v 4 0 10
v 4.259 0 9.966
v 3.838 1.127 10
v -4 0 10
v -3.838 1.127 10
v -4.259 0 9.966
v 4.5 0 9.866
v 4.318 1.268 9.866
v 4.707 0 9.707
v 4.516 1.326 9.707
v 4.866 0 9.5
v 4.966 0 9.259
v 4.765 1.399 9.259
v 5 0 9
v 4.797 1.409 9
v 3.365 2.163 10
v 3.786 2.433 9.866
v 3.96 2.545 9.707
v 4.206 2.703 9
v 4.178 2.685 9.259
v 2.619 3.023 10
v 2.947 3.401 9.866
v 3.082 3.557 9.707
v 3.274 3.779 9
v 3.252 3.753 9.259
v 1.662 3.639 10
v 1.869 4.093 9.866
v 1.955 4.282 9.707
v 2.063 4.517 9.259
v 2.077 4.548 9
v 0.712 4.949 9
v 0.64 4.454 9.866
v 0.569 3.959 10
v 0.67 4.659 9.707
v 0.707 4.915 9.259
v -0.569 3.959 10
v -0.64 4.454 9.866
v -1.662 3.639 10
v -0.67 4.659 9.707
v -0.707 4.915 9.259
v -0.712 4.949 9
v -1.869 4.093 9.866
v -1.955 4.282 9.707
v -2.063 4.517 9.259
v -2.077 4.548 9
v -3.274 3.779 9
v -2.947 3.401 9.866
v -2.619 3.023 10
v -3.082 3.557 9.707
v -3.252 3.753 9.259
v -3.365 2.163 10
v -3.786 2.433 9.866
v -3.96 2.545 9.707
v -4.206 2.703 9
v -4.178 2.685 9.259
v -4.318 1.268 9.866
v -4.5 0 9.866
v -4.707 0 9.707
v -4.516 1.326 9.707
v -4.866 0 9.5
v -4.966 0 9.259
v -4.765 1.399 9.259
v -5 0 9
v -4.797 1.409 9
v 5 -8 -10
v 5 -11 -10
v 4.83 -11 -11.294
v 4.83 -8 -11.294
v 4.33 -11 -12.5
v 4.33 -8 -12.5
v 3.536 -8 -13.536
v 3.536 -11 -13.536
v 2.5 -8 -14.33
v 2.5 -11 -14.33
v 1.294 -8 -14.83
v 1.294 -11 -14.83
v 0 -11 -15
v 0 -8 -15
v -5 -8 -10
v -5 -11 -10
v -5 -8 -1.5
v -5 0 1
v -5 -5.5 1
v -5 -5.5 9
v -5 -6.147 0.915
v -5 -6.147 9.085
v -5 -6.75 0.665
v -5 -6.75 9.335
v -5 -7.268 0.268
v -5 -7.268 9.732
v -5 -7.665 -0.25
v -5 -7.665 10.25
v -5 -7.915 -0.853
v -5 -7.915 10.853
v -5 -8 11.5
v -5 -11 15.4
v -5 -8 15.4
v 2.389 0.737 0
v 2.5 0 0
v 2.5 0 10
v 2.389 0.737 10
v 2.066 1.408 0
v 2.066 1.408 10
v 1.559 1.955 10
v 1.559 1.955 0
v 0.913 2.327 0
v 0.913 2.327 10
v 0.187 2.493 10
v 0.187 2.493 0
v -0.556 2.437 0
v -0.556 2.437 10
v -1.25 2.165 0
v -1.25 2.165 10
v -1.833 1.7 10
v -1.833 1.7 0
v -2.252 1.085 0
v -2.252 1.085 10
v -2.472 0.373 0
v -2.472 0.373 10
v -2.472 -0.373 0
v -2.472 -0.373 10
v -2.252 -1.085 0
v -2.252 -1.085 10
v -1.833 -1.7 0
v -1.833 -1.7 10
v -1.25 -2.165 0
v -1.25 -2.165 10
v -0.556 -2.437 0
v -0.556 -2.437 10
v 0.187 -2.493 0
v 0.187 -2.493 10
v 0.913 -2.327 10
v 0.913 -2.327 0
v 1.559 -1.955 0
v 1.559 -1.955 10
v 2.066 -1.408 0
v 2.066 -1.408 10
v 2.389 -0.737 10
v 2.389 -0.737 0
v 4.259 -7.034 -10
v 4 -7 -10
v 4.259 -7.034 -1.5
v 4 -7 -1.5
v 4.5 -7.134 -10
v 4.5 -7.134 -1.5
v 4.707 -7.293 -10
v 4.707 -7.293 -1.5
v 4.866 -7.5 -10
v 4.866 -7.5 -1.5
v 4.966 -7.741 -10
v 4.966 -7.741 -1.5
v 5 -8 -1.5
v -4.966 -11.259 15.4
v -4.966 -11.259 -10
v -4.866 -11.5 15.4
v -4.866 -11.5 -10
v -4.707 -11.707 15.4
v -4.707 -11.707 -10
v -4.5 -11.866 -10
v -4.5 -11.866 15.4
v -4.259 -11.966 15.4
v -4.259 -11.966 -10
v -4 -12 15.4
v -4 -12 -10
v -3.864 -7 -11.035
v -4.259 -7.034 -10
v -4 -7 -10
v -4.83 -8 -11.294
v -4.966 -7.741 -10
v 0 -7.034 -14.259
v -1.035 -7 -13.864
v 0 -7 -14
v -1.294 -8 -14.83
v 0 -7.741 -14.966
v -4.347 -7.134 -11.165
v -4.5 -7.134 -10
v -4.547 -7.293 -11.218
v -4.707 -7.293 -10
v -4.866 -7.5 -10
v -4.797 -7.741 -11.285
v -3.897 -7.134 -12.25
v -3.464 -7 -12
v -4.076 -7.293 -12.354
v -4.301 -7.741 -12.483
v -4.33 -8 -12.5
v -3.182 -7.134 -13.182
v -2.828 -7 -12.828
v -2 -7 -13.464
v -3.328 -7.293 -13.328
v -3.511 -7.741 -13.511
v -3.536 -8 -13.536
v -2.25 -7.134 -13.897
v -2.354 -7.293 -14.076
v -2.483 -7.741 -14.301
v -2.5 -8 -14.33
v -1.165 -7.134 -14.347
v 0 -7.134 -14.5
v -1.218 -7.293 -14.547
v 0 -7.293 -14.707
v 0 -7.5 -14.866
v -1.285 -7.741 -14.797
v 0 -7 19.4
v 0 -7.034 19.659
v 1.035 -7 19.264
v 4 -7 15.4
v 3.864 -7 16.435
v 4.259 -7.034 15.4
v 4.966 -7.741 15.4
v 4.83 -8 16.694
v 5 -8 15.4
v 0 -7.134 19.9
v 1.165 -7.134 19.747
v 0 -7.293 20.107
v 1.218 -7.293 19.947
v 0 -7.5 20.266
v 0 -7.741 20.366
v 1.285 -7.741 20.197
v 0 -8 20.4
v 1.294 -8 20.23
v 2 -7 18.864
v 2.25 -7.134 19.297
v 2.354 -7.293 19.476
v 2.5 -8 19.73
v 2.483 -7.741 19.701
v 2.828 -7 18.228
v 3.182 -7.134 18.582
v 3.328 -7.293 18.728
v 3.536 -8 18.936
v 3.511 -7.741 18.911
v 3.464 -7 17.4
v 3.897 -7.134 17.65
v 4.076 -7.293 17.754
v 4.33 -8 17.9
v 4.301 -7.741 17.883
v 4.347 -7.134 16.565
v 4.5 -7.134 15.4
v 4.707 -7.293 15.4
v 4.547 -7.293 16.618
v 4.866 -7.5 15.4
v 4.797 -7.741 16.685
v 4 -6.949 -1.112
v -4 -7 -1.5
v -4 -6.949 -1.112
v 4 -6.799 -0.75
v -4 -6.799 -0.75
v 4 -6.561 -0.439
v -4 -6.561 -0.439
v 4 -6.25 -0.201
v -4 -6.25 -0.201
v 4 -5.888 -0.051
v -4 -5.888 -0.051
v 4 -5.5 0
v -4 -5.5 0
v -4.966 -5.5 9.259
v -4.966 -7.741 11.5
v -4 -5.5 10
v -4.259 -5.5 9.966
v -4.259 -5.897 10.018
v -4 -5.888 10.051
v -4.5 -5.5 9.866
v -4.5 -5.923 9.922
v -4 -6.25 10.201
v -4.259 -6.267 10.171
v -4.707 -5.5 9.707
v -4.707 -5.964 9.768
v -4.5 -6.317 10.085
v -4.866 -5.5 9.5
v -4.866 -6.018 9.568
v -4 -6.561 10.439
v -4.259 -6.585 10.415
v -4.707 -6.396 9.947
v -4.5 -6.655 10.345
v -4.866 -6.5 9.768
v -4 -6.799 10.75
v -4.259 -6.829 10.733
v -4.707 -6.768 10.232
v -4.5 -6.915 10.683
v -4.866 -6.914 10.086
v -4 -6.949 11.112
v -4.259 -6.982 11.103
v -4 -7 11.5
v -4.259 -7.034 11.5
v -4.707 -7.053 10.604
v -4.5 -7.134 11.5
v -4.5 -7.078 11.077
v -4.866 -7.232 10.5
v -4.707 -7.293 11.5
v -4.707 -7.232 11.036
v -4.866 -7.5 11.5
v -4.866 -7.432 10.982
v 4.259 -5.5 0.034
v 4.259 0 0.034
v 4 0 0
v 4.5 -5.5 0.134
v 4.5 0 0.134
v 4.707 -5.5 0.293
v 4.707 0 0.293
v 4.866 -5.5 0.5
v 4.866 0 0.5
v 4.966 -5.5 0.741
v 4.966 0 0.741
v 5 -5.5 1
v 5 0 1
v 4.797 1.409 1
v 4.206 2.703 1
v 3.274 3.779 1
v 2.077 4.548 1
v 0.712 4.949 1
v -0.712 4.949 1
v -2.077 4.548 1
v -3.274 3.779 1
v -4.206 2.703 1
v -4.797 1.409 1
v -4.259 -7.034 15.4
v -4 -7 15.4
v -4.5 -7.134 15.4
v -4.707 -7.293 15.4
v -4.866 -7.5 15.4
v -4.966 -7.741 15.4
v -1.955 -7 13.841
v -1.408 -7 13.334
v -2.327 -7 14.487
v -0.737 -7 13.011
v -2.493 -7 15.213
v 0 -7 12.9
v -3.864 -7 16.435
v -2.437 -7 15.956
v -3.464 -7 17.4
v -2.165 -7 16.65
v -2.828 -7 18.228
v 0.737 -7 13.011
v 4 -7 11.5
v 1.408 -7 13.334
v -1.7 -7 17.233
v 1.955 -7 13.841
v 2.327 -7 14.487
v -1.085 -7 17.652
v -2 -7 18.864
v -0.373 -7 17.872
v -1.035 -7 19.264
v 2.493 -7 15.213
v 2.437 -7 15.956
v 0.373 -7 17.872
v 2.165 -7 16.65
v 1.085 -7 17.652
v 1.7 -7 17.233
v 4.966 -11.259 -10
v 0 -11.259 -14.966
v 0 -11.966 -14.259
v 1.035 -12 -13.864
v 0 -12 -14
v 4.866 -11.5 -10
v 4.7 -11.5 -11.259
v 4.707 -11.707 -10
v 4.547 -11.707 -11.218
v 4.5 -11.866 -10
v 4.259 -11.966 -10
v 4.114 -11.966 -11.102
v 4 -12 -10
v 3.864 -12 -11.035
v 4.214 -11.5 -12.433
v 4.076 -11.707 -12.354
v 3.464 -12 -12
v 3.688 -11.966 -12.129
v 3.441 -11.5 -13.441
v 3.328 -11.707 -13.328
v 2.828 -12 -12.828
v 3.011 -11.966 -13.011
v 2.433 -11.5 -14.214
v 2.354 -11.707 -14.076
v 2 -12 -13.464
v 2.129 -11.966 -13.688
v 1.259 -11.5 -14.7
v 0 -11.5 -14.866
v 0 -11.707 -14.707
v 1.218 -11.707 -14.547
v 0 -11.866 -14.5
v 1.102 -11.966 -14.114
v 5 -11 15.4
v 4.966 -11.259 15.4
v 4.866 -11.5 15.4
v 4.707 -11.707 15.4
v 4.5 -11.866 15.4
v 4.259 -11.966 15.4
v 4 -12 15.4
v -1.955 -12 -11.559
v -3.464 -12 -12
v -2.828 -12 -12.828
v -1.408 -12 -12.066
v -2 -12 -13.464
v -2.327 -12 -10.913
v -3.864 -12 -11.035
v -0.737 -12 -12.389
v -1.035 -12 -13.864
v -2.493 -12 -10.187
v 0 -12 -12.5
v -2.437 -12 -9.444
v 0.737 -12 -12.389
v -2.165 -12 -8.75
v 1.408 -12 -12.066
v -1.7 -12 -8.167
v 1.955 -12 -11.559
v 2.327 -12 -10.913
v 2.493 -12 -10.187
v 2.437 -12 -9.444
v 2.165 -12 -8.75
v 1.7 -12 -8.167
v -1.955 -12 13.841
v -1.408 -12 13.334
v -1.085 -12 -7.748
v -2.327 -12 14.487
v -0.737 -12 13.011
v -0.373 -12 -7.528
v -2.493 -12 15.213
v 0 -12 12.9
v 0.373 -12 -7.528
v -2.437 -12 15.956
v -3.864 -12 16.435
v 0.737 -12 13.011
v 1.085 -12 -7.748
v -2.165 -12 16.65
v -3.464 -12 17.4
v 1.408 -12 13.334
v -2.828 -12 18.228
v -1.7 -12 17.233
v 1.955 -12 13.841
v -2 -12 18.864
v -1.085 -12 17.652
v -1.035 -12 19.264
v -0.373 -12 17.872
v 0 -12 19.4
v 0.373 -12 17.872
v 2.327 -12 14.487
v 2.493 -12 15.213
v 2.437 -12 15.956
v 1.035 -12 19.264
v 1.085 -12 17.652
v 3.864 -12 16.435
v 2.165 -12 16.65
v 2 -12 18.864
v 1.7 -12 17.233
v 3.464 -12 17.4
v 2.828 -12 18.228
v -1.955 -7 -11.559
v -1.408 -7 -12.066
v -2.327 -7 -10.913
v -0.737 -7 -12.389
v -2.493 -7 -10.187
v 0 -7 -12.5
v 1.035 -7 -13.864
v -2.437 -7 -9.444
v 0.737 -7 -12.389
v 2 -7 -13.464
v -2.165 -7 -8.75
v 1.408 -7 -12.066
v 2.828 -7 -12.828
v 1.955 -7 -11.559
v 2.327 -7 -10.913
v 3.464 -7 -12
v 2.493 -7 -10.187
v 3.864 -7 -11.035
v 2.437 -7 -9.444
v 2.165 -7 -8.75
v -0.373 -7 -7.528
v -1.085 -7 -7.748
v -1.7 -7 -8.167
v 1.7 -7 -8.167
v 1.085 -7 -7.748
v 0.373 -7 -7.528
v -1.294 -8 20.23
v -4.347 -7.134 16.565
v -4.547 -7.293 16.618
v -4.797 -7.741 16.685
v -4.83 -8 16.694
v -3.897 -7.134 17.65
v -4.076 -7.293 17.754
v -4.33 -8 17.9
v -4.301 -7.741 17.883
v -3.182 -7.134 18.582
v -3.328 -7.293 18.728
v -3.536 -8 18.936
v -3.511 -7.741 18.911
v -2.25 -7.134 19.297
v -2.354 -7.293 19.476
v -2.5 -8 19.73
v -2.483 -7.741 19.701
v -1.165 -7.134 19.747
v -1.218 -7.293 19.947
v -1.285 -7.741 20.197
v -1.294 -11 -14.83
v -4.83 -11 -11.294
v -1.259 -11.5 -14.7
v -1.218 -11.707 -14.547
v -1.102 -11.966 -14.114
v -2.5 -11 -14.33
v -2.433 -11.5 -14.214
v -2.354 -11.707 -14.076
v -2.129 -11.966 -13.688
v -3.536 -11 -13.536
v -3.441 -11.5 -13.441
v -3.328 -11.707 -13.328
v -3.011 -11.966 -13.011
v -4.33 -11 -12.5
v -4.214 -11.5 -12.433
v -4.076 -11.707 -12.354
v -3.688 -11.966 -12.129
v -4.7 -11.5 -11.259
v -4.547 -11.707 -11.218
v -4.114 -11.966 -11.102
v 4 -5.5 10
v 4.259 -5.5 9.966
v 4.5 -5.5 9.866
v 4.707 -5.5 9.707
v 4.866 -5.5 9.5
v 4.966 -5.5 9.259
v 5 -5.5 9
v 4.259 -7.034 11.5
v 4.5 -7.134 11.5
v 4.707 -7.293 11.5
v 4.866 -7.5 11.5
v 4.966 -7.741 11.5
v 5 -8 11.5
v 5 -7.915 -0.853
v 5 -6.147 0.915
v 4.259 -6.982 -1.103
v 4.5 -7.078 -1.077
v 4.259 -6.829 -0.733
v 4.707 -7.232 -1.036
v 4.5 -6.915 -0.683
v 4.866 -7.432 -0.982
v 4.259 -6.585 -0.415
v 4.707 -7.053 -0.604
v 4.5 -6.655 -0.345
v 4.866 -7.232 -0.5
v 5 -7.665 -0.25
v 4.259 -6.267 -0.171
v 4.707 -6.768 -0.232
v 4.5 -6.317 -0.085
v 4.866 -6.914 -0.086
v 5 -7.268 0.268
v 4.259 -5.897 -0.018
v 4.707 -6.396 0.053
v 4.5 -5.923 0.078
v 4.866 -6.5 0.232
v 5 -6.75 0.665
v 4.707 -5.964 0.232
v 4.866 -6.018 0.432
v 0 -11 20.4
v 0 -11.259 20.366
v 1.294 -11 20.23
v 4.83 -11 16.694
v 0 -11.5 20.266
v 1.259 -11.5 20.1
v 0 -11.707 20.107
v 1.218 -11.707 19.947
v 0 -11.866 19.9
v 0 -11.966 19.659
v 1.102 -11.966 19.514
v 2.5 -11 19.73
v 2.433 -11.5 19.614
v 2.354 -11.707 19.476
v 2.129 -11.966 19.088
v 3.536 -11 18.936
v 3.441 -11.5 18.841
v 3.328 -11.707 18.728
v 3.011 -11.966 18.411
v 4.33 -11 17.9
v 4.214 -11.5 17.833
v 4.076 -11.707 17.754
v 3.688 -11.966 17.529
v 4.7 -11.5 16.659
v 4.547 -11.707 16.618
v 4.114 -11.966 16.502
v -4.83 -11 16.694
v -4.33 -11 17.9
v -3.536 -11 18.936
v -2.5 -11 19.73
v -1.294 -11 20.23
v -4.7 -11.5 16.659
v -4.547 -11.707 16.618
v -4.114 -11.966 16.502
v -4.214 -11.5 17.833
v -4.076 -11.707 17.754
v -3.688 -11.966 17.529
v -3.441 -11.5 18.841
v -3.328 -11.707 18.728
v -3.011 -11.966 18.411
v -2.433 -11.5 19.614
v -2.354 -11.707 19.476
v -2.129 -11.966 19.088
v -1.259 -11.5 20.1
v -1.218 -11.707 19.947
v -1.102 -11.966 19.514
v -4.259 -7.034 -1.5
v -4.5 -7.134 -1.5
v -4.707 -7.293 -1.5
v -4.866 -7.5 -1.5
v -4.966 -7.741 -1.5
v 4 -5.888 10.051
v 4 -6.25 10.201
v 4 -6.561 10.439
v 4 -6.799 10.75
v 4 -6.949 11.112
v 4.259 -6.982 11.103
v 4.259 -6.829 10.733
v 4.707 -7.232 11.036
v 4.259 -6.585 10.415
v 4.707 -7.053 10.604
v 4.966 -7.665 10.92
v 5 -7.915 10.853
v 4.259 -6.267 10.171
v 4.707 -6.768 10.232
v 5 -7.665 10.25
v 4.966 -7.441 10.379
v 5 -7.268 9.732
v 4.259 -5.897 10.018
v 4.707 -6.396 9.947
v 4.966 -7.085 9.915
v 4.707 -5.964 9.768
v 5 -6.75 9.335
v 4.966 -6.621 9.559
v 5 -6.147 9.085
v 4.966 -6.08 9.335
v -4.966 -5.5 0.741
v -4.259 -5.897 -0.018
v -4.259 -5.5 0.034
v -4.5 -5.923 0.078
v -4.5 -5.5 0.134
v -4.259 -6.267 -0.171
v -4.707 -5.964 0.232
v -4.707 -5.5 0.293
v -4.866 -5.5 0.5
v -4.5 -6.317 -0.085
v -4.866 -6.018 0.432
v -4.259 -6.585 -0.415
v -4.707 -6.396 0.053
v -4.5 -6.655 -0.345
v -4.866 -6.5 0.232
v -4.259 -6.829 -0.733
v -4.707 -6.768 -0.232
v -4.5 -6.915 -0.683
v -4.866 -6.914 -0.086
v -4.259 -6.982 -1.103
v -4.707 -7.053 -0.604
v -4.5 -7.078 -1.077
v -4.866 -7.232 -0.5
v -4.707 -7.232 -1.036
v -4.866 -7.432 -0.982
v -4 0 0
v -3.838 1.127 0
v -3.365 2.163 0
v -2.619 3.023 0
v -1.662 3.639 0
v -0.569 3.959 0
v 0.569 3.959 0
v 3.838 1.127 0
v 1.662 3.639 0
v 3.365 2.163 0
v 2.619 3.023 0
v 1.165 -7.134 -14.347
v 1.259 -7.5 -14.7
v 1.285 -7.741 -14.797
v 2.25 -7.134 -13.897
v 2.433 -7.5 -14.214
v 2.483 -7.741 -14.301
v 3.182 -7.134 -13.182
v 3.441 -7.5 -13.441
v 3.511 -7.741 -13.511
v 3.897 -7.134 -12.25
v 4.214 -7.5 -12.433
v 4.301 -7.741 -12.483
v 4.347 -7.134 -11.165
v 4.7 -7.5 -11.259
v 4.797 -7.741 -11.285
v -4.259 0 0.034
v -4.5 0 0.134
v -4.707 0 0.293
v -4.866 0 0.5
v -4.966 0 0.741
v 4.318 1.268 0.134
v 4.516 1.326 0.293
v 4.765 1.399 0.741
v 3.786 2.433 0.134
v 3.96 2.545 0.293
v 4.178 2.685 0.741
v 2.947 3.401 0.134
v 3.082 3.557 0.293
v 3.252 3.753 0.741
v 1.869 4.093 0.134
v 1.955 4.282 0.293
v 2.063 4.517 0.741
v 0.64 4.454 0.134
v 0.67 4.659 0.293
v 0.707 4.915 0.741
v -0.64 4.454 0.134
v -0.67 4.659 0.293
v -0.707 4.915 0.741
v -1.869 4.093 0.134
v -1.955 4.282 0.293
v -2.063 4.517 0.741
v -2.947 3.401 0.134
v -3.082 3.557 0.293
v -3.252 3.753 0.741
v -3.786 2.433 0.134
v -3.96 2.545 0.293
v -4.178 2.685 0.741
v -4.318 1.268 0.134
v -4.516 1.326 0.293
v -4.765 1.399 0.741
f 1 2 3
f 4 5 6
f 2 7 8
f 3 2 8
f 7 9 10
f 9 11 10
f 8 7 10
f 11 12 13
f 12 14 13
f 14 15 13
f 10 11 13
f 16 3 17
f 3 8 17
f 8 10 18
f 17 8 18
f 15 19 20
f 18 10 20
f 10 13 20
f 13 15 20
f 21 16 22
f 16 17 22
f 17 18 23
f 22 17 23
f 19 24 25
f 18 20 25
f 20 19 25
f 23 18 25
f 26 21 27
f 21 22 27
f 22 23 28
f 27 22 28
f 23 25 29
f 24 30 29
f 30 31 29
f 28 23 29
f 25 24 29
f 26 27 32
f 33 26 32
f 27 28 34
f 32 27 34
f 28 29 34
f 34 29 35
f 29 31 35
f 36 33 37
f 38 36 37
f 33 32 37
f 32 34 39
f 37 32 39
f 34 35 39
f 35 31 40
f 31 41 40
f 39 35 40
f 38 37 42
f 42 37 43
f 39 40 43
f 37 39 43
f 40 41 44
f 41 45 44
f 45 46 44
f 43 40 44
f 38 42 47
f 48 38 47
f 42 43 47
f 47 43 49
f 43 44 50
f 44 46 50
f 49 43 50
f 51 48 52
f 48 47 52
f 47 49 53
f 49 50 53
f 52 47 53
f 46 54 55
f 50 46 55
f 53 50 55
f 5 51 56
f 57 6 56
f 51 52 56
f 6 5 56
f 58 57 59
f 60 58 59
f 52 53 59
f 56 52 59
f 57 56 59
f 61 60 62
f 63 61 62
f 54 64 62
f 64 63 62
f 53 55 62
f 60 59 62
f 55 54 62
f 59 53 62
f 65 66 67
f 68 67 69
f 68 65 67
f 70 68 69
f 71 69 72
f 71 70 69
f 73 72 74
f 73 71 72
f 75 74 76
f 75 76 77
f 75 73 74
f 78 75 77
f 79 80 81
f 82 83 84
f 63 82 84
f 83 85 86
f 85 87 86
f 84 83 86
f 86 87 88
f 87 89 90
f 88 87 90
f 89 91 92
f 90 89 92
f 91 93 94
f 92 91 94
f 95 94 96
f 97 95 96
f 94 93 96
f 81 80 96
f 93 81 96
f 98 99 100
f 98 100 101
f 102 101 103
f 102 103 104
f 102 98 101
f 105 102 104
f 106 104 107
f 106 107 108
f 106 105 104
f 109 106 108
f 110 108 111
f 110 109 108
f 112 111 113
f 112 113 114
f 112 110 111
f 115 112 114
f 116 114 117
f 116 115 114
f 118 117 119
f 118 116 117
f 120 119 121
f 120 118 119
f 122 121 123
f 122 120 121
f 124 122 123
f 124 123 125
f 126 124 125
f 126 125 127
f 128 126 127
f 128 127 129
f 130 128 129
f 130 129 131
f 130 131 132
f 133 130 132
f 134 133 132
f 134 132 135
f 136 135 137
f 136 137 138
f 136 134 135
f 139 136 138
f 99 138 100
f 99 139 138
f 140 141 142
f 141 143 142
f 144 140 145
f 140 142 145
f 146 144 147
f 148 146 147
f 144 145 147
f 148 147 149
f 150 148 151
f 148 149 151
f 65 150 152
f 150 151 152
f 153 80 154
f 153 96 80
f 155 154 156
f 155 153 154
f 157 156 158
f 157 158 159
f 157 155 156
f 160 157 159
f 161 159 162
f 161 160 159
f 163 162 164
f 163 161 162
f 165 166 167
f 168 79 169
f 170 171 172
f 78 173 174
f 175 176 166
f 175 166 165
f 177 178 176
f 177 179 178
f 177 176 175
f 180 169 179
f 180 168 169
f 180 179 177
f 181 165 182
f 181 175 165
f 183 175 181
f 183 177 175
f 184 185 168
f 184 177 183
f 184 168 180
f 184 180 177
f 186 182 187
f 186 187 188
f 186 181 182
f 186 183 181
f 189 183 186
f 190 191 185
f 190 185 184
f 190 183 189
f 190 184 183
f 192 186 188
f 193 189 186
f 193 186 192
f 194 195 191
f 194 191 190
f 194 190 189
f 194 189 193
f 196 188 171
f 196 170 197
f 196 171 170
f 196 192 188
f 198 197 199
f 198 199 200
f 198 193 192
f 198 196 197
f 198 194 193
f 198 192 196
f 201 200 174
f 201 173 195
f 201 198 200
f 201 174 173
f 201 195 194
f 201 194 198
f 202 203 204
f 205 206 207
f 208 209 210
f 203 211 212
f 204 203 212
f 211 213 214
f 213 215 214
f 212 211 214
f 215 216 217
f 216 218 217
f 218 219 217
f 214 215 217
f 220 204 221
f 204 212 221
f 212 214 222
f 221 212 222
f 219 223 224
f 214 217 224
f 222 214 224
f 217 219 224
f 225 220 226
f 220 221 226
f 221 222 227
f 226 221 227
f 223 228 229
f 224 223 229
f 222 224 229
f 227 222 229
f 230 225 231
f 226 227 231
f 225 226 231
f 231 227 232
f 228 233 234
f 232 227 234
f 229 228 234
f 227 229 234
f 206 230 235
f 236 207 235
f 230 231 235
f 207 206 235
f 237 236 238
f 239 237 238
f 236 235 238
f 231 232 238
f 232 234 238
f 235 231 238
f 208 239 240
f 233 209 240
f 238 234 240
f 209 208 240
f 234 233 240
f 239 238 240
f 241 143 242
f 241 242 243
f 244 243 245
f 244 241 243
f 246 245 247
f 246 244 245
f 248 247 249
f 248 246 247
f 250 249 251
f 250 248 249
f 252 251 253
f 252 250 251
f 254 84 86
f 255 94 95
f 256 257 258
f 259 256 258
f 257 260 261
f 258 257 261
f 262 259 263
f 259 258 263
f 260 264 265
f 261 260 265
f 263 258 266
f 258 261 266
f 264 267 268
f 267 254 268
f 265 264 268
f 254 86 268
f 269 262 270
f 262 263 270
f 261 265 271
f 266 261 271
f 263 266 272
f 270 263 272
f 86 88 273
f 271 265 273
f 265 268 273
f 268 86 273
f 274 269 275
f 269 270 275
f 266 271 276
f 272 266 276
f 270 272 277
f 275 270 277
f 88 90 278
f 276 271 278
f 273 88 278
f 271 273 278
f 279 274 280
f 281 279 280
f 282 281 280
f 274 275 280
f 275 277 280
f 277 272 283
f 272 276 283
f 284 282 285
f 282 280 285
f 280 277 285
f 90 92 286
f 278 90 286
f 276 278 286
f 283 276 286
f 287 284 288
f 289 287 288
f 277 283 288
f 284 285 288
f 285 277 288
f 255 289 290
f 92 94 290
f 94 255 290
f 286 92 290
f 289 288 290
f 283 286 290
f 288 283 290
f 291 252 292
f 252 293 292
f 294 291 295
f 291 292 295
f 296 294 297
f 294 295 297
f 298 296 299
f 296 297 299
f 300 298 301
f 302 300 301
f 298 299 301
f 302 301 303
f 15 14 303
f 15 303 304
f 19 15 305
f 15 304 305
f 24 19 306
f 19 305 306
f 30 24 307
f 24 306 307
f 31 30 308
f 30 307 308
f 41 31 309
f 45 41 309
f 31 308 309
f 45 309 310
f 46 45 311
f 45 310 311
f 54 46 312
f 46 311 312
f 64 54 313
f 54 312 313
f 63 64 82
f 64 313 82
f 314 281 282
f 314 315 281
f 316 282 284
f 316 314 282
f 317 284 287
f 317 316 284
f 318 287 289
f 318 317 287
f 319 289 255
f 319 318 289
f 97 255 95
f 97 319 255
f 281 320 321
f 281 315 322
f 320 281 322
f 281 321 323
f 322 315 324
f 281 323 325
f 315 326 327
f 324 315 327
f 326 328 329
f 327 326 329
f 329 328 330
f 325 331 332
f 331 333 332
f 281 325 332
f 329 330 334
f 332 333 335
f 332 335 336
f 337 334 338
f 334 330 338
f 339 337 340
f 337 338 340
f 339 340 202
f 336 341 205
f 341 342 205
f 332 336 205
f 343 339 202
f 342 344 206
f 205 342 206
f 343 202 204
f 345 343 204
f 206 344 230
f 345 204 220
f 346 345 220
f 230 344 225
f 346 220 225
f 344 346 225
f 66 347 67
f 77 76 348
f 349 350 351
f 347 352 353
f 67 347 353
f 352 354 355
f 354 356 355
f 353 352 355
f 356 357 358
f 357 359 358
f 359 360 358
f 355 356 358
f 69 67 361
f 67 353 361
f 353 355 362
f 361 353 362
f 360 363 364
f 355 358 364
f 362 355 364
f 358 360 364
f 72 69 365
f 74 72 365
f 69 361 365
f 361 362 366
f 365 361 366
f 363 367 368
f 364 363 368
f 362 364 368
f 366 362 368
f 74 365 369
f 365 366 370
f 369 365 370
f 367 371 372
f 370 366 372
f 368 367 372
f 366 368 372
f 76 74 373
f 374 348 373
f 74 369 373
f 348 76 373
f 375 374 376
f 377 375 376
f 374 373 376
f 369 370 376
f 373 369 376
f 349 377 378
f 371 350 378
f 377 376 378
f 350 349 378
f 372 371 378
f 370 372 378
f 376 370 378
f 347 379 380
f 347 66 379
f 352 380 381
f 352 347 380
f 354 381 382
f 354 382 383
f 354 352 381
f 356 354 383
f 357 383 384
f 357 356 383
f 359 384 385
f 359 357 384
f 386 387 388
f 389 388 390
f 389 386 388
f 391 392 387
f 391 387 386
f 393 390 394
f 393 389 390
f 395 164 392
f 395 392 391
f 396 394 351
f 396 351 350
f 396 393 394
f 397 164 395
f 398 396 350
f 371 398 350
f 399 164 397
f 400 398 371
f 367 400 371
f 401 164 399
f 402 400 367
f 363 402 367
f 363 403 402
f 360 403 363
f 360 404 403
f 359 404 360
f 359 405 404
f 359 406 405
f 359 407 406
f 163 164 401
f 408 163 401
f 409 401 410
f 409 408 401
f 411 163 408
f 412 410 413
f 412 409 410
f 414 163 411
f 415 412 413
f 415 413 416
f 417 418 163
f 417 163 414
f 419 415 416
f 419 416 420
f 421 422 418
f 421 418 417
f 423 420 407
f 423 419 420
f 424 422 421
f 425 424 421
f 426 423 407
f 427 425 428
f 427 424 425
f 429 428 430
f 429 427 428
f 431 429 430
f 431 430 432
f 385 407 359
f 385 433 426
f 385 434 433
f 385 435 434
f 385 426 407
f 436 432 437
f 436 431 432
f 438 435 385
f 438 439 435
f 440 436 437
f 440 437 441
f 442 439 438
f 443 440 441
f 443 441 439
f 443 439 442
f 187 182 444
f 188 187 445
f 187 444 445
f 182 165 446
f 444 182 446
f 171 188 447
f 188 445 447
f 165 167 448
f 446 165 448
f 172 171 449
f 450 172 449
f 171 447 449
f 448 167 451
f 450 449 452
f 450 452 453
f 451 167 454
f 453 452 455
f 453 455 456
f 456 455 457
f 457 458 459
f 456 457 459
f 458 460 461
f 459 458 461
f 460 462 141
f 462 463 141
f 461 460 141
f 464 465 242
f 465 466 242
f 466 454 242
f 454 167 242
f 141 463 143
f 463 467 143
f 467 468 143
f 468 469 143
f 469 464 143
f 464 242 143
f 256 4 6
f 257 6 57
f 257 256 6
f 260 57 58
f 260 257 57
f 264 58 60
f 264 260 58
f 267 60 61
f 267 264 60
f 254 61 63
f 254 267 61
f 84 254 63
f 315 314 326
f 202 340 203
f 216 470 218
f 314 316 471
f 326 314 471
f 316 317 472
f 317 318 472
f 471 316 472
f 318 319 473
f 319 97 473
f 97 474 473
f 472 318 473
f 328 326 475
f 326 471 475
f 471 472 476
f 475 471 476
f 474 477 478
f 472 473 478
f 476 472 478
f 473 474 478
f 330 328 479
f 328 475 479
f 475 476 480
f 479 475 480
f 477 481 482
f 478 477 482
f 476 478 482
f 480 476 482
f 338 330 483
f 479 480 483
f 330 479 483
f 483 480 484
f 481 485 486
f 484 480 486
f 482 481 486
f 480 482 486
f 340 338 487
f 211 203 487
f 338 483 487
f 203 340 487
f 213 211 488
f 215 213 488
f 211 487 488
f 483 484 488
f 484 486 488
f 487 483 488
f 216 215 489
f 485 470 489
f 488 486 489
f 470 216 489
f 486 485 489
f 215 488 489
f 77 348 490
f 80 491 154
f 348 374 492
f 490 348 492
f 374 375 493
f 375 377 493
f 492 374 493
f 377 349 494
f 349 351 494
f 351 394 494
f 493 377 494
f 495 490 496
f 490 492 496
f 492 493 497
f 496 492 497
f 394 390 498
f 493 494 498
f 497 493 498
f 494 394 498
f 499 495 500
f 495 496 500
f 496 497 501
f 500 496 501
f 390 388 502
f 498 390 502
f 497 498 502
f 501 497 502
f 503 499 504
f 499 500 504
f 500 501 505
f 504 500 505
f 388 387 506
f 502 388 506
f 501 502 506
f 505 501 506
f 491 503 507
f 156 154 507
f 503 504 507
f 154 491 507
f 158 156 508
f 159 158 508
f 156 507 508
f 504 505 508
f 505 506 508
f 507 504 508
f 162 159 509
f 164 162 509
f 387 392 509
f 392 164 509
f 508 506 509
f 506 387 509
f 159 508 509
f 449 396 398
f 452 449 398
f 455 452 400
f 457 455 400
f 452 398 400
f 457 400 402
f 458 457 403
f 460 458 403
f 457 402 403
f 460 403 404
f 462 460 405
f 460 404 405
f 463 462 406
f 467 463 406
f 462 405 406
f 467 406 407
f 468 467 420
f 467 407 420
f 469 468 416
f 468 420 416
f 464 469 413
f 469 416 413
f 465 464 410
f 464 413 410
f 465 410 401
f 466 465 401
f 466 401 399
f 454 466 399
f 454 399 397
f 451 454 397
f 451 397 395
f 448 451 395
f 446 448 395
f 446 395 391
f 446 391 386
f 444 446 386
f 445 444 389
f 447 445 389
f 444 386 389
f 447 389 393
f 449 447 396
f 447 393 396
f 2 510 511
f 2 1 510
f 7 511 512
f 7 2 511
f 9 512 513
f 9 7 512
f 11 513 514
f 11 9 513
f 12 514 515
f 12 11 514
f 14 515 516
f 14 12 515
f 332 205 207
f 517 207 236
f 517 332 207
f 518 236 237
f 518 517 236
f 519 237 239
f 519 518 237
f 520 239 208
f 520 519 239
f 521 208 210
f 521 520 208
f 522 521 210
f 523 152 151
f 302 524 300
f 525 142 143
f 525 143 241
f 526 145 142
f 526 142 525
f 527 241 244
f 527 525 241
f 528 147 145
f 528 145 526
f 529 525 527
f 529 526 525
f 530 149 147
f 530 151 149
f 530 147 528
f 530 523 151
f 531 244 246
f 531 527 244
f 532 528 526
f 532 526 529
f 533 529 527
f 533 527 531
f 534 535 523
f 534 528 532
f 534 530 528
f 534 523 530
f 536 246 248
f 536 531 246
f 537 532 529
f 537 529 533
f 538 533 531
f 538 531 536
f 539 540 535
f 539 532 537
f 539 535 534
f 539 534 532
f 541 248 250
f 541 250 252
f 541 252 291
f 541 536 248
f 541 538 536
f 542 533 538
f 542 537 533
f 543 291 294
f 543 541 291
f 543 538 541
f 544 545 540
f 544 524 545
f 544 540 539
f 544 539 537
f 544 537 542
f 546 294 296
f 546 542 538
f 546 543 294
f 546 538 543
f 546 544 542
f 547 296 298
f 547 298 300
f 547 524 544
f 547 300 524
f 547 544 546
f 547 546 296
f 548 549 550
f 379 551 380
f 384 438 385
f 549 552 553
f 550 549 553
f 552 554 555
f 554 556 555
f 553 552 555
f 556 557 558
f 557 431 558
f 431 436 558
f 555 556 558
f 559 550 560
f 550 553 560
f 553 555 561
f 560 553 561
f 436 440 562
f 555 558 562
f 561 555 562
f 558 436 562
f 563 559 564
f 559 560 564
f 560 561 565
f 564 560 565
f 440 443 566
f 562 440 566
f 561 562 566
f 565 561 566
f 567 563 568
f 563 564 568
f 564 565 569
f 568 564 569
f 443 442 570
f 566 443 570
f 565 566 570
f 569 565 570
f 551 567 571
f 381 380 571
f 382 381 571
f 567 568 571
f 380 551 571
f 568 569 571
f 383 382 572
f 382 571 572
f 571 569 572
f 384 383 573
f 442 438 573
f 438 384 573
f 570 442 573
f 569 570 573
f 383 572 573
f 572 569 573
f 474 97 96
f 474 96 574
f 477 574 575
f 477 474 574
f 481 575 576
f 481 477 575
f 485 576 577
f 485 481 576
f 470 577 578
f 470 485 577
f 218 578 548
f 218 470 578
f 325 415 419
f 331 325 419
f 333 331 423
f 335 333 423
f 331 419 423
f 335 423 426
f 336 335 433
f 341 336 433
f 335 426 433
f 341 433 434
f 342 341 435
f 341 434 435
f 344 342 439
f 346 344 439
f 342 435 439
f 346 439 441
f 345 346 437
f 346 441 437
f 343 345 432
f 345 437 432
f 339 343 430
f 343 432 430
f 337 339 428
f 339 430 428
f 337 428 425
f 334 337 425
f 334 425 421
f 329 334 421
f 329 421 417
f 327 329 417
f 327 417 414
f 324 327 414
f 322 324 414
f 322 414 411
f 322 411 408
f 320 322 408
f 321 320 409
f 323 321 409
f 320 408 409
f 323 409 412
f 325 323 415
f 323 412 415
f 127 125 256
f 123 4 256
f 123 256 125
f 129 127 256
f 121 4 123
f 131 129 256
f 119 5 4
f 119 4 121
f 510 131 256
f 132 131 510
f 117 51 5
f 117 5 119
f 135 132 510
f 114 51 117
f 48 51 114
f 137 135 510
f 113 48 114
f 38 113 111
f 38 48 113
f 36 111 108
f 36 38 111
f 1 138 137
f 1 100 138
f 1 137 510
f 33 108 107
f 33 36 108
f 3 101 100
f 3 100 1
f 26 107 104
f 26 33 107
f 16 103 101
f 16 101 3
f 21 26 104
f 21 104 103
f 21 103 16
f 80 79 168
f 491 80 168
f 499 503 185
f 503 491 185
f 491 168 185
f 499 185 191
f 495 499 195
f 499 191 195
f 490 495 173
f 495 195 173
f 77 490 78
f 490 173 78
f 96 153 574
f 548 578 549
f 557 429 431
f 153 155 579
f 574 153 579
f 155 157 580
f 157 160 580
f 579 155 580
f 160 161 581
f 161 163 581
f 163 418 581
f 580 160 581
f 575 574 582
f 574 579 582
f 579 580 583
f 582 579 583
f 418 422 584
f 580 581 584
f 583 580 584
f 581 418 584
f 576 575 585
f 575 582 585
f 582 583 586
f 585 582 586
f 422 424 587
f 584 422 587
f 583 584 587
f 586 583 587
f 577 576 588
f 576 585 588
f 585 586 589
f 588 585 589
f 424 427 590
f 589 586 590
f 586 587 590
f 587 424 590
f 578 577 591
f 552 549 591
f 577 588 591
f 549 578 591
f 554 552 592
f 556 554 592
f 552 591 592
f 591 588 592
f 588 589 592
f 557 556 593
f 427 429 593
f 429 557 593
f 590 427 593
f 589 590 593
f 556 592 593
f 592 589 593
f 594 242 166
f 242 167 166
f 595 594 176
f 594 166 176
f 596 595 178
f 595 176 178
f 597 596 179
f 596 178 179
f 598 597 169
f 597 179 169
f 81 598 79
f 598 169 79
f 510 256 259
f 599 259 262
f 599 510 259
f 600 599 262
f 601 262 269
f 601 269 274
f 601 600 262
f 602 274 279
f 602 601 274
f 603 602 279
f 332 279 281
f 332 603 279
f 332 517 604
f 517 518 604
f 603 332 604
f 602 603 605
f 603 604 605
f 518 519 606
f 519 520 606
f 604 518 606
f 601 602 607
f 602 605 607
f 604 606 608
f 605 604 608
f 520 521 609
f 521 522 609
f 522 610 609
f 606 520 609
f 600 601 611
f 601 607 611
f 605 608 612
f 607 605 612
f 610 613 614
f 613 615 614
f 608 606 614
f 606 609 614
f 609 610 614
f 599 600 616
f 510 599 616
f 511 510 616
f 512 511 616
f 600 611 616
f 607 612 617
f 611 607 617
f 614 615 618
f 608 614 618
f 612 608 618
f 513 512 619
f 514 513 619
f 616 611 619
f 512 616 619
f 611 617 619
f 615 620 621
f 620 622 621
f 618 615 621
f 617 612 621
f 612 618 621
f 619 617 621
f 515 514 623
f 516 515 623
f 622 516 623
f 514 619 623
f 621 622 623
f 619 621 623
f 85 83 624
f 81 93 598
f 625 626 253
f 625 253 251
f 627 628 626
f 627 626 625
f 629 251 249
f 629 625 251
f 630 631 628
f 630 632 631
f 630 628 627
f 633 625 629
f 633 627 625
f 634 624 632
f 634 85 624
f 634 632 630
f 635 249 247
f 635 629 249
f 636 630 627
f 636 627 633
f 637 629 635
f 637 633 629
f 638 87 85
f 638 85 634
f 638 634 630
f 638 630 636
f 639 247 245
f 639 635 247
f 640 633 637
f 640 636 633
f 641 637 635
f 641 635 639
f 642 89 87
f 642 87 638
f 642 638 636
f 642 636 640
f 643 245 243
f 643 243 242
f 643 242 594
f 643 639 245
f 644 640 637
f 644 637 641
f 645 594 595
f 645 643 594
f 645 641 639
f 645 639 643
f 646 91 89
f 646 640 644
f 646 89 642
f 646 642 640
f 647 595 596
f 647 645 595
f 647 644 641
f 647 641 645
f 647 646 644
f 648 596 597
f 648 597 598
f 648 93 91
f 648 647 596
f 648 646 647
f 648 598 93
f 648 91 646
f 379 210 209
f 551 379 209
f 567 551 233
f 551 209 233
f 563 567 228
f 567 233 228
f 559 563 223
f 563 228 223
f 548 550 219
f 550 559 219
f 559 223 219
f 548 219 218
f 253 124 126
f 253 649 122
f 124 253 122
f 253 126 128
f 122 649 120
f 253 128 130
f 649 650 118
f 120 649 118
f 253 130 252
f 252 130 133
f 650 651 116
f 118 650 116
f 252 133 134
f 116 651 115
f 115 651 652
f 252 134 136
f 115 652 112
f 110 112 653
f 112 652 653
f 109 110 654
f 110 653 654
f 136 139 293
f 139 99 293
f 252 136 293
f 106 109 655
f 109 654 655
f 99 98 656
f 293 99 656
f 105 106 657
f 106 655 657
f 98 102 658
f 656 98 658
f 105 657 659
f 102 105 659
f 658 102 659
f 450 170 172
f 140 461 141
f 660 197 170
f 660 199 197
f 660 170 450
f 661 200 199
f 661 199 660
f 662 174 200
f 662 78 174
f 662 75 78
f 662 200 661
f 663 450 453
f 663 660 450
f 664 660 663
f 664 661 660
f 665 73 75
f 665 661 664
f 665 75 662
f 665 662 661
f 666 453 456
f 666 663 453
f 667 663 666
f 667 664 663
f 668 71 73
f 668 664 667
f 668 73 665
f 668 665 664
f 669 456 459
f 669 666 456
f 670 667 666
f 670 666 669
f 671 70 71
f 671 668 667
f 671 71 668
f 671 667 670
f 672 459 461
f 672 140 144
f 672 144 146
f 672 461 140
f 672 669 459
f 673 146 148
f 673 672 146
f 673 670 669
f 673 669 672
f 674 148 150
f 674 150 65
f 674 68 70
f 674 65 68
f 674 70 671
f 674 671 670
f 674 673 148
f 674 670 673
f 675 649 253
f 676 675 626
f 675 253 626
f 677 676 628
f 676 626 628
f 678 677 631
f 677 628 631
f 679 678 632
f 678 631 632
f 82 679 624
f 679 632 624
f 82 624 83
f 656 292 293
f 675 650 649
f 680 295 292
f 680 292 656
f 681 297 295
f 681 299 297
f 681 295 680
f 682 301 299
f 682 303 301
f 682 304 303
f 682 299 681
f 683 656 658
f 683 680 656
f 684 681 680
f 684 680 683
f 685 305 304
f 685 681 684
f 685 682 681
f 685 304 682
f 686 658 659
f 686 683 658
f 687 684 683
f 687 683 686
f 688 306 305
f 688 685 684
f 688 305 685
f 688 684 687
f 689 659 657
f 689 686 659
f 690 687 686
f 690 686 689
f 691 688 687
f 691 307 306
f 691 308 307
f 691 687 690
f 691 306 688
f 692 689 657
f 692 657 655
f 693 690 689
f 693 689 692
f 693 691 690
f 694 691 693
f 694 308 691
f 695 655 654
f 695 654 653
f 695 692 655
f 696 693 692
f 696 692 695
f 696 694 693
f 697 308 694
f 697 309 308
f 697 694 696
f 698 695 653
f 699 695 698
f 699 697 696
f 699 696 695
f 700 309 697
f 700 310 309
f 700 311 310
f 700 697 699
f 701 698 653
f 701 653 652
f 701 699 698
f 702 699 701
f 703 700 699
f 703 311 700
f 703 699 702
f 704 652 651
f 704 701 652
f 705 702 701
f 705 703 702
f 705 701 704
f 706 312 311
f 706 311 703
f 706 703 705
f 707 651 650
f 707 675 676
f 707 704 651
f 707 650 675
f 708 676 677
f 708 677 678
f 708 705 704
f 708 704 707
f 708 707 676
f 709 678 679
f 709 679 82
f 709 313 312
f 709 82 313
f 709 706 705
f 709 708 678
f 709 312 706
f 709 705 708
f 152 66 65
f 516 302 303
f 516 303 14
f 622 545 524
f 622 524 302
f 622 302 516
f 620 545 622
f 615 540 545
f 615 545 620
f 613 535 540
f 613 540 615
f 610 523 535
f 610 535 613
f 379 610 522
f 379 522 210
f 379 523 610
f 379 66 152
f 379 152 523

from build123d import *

# Parameters (mm, degrees)
SKETCH1_R           = 2.5
BOSS_EXTRUDE1_DEPTH = 10
SKETCH2_W           = 10
SKETCH2_H           = 15
SKETCH2_R           = 2.5
SKETCH2_H_2         = 10.4
BOSS_EXTRUDE2_DEPTH = 5
FILLET1_R           = 5
FILLET2_R           = 1.5
FILLET3_R           = 1


with BuildPart() as part:
    # Sketch1 → Boss-Extrude1 (new body)
    with BuildSketch(Plane.XY):
        with BuildLine():
            Line((-5, 0), (-5, -12))
            Line((-5, -12), (5, -12))
            Line((5, -12), (5, 0))
            ThreePointArc((5, 0), (0, 5), (-5, 0))
        make_face()
        Circle(SKETCH1_R, mode=Mode.SUBTRACT)
    extrude(amount=BOSS_EXTRUDE1_DEPTH)

    # Sketch2 → Boss-Extrude2 (add)
    # profile 1 of 2: a face of its own
    with BuildSketch(Plane.XZ.offset(12)):
        with Locations((0, -7.5)):
            Rectangle(SKETCH2_W, SKETCH2_H)
        with Locations(Location((0, -10, 0), (0, 0, 270))):
            Circle(SKETCH2_R, mode=Mode.SUBTRACT)
    # profile 2 of 2: a face of its own
    with BuildSketch(Plane.XZ.offset(12)):
        with Locations((0, 15.2)):
            Rectangle(SKETCH2_W, SKETCH2_H_2)
        with Locations(Location((0, 15.4, 0), (0, 0, 270))):
            Circle(SKETCH2_R, mode=Mode.SUBTRACT)
    extrude(amount=-BOSS_EXTRUDE2_DEPTH)

    # Fillet1
    fillet1_edges = [part.edges().sort_by_distance(p)[0] for p in [
        (5, -9.5, -15),
        (5, -9.5, 20.4),
        (-5, -9.5, 20.4),
        (-5, -9.5, -15),
    ]]
    fillet(fillet1_edges, radius=FILLET1_R - 0.0001)  # a hair under: the kernel refuses the full size

    # Fillet2
    fillet2_edges = [part.edges().sort_by_distance(p)[0] for p in [
        (0, -7, 0),
        (0, -7, 10),
    ]]
    fillet(fillet2_edges, radius=FILLET2_R)

    # Fillet3
    fillet3_edges = [part.edges().sort_by_distance(p)[0] for p in [
        (5, -2.75, 10),
        (0, 5, 10),
        (-5, -2.75, 10),
        (-5, -12, 2.7),
        (5, -12, 2.7),
        (-3.535563195, -12, -13.535563195),
        (3.535563195, -12, -13.535563195),
        (-3.535563195, -12, 18.935563195),
        (3.535563195, -12, 18.935563195),
        (5, -7, -5.75005),
        (-3.535563195, -7, -13.535563195),
        (3.535563195, -7, -13.535563195),
        (-5, -7, 13.45005),
        (-3.535563195, -7, 18.935563195),
        (3.535563195, -7, 18.935563195),
        (5, -7, 13.45005),
        (-5, -7, -5.75005),
        (5, -6.560660172, 10.439339828),
        (-5, -6.560660172, 10.439339828),
        (-5, -6.560660172, -0.439339828),
        (5, -6.560660172, -0.439339828),
        (-5, -2.75, 0),
        (0, 5, 0),
        (5, -2.75, 0),
    ]]
    fillet(fillet3_edges, radius=FILLET3_R)


solid = part.part
